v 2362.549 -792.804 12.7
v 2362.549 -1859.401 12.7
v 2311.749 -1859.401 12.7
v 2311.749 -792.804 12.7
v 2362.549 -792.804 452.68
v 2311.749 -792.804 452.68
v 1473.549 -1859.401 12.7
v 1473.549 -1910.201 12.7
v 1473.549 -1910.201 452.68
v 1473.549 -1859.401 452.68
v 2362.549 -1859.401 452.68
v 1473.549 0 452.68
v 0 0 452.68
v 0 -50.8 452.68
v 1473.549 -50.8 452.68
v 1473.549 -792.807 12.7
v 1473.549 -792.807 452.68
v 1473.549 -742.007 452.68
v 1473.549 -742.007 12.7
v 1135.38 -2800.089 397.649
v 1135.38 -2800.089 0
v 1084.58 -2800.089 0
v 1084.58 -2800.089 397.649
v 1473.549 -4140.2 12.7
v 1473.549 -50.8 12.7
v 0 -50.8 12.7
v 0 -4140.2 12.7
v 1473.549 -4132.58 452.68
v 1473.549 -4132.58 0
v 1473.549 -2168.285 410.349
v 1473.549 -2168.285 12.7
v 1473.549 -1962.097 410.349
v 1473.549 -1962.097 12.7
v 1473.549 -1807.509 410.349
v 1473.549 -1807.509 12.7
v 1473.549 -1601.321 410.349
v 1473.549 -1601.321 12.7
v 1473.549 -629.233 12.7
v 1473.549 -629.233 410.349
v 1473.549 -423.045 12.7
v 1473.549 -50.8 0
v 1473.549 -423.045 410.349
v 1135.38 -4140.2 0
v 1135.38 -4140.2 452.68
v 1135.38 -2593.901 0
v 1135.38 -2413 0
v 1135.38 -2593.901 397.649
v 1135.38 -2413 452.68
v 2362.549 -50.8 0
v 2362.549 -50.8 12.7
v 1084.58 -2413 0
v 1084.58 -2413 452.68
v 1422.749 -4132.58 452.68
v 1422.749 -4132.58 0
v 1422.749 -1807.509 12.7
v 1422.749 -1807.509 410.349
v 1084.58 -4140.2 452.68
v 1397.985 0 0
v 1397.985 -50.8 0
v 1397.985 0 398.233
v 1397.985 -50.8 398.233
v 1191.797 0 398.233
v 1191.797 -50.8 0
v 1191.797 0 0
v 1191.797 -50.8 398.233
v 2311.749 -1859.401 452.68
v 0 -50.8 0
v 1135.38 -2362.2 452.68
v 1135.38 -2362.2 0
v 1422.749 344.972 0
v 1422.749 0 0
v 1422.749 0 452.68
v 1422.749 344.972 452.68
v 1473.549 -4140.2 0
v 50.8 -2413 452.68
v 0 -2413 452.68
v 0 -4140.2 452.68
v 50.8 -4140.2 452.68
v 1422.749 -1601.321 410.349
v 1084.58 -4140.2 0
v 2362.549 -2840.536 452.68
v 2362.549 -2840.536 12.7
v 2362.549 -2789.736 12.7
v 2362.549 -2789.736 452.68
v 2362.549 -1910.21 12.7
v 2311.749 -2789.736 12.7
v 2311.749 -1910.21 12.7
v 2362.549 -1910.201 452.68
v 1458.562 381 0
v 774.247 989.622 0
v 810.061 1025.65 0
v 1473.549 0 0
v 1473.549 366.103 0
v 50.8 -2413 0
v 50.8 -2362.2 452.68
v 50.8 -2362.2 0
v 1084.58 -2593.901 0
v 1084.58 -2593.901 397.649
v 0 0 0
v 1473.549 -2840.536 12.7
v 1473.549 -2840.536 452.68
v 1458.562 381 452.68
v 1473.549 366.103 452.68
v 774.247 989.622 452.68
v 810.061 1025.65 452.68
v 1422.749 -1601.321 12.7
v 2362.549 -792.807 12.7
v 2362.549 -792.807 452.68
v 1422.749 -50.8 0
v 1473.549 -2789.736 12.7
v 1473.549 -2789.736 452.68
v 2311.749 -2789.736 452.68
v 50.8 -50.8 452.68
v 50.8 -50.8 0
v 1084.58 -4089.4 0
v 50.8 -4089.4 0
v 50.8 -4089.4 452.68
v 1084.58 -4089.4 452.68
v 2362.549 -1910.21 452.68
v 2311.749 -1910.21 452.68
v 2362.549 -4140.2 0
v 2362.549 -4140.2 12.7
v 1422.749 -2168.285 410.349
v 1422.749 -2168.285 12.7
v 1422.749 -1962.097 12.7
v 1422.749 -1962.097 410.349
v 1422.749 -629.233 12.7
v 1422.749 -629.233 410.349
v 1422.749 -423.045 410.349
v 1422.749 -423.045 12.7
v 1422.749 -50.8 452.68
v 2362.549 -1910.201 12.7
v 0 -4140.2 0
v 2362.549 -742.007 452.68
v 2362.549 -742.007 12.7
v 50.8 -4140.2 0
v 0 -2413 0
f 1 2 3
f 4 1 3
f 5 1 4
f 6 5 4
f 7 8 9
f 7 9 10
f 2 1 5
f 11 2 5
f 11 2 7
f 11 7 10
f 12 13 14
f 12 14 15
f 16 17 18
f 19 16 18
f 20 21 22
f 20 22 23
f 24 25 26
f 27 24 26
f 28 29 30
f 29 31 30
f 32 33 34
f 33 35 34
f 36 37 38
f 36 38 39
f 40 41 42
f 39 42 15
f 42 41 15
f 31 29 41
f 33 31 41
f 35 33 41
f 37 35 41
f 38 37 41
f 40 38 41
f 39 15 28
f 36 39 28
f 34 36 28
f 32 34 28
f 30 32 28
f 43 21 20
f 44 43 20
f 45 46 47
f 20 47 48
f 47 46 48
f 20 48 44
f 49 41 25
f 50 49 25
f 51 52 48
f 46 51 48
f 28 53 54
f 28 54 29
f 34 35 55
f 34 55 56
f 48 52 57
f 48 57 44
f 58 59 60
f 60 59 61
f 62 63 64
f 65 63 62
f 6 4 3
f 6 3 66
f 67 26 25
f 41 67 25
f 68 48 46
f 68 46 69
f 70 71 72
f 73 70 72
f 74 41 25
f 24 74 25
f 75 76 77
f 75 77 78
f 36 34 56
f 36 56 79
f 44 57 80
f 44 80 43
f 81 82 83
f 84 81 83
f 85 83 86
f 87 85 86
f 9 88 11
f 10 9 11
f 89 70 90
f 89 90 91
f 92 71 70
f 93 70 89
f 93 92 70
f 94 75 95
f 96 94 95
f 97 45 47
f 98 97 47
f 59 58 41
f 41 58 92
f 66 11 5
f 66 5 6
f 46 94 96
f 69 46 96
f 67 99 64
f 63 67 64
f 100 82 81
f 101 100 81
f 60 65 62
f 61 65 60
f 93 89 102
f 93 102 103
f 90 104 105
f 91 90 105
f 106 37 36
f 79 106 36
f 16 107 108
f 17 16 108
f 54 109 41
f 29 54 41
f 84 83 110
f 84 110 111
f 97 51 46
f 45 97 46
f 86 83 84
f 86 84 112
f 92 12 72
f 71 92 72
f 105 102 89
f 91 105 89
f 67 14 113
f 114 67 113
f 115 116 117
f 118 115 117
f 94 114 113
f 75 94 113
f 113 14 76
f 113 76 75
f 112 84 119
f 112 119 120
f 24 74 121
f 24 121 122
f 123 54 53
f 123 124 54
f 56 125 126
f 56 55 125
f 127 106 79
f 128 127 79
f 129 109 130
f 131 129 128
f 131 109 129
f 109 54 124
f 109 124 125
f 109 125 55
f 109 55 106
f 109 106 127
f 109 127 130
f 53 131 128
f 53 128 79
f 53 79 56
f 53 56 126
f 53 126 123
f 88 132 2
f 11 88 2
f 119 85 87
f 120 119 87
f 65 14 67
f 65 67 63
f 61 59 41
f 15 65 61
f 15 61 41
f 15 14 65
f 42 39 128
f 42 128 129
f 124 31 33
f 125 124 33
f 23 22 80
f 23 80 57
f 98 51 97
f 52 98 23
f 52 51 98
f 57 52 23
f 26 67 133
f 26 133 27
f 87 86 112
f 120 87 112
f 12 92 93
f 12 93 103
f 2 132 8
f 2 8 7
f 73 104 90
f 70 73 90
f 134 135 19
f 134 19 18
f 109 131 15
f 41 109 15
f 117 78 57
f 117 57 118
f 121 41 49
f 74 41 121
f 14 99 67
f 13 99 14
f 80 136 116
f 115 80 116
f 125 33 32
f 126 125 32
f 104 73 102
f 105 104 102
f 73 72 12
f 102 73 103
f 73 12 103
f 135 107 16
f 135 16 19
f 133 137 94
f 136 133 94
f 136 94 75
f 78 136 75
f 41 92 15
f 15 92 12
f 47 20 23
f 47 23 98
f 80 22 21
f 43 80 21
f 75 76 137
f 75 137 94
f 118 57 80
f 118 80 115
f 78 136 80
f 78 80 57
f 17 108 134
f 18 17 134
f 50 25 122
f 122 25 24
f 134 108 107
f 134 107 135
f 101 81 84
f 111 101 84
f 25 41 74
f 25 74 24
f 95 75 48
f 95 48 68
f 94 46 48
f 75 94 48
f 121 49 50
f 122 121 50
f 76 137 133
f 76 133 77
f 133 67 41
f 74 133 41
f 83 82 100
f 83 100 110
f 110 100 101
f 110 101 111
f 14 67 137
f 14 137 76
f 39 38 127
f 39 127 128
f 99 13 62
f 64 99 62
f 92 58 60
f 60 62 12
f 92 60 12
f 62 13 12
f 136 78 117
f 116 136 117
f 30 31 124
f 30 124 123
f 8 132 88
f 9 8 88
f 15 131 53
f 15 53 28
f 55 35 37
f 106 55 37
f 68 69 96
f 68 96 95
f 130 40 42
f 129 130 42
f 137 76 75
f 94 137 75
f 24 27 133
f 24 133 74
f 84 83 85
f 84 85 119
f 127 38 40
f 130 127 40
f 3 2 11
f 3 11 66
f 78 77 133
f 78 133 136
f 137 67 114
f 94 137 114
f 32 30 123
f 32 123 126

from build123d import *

# Parameters (mm, degrees)
F0_W      = 1473.5485315323
F0_H      = 452.6799321175
F1_DEPTH  = 50.8
F2_W      = 206.188082695
F2_H      = 398.2329070568
F3_DEPTH  = 71.12
F4_W      = 50.8
F4_H      = 452.6799321175
F5_DEPTH  = 2362.2
F6_W      = 50.8
F6_H      = 452.6799321175
F7_DEPTH  = 1084.58
F8_W      = 50.8
F8_H      = 452.6799321175
F9_DEPTH  = 1727.2
F10_W     = 206.188082695
F10_H     = 397.6490842178
F11_DEPTH = 111.76
F12_W     = 1191.797375679
F12_H     = 12.7
F12_W_2   = 206.188082695
F12_W_3   = 75.5630731583
F13_DEPTH = 4089.4
F14_DEPTH = 1727.2
F15_W     = 50.8
F15_H     = 452.6799321175
F16_DEPTH = 1033.78
F17_W     = 50.8
F17_H     = 452.6799321175
F18_DEPTH = 4081.78
F19_W     = 206.188082695
F19_H     = 397.6490842178
F20_DEPTH = 314.96
F21_W     = 50.8
F21_H     = 439.9799321175
F22_DEPTH = 889
F23_W     = 50.8
F23_H     = 439.9799321175
F24_DEPTH = 889
F25_W     = 50.8
F25_H     = 439.9799321175
F26_DEPTH = 879.5258
F27_W     = 50.8
F27_H     = 439.9799321175
F28_DEPTH = 889
F29_W     = 50.8
F29_H     = 439.9799321175
F30_DEPTH = 1066.5968
F31_DEPTH = 889
F32_W     = 50.8
F32_H     = 452.6799321175
F33_DEPTH = 381
F35_DEPTH = 505.46
F36_DEPTH = 914.4
F38_DEPTH = 546.1


with BuildPart() as f1:
    # F0 (on Front) → F1 (new body)
    with BuildSketch(Plane.XZ):
        with Locations((736.7742657661, 226.3399660587)):
            Rectangle(F0_W, F0_H)
    extrude(amount=F1_DEPTH)

    # F2 (on face) → F3 (cut)
    with BuildSketch(Plane.XZ.offset(50.8)):
        with Locations((1294.8914170265, 199.1164535284)):
            Rectangle(F2_W, F2_H)
    extrude(amount=-F3_DEPTH, mode=Mode.SUBTRACT)


with BuildPart() as f5:
    # F4 (on face) → F5 (new body)
    with BuildSketch(Plane.XZ.offset(50.8)):
        with Locations((25.4, 226.3399660587)):
            Rectangle(F4_W, F4_H)
    extrude(amount=F5_DEPTH)


with BuildPart() as f7:
    # F6 (on face) → F7 (new body)
    with BuildSketch(Plane.YZ.offset(50.8)):
        with Locations((-2387.6, 226.3399660587)):
            Rectangle(F6_W, F6_H)
    extrude(amount=F7_DEPTH)


with BuildPart() as f9:
    # F8 (on face) → F9 (new body)
    with BuildSketch(Plane.XZ.offset(2413)):
        with Locations((1109.98, 226.3399660587)):
            Rectangle(F8_W, F8_H)
    extrude(amount=F9_DEPTH)

    # F10 (on face) → F11 (cut)
    with BuildSketch(Plane.YZ.offset(1135.38)):
        with Locations((-2696.995358963, 198.8245421089)):
            Rectangle(F10_W, F10_H)
    extrude(amount=-F11_DEPTH, mode=Mode.SUBTRACT)


with BuildPart() as f13:
    # F12 (on face) → F13 (new body)
    with BuildSketch(Plane.XZ.offset(50.8)):
        with Locations((595.8986878395, 6.35)):
            Rectangle(F12_W, F12_H)
        with Locations((1294.8914170265, 6.35)):
            Rectangle(F12_W_2, F12_H)
        with Locations((1435.7669949532, 6.35)):
            Rectangle(F12_W_3, F12_H)
    extrude(amount=F13_DEPTH)


with BuildPart() as f14:
    # F14 (new): a face of the model
    f14_faces = [f5.part.faces().sort_by_distance(p)[0] for p in [
        (25.4, -2413, 226.3399660587),
    ]]
    extrude(f14_faces, amount=F14_DEPTH)


with BuildPart() as f16:
    # F15 (on face) → F16 (new body)
    with BuildSketch(Plane.YZ.offset(50.8)):
        with Locations((-4114.8, 226.3399660587)):
            Rectangle(F15_W, F15_H)
    extrude(amount=F16_DEPTH)


with BuildPart() as f18:
    # F17 (on face) → F18 (new body)
    with BuildSketch(Plane.XZ.offset(50.8)):
        with Locations((1448.1485315323, 226.3399660587)):
            Rectangle(F17_W, F17_H)
    extrude(amount=F18_DEPTH)

    # F19 (on face) → F20 (cut)
    with BuildSketch(Plane.YZ.offset(1473.5485315323)):
        with Locations((-2065.1913285255, 211.5245419554)):
            Rectangle(F19_W, F19_H)
        with Locations((-1704.414665699, 211.5245419554)):
            Rectangle(F19_W, F19_H)
        with Locations((-526.1393785477, 211.5245421089)):
            Rectangle(F19_W, F19_H)
    extrude(amount=-F20_DEPTH, mode=Mode.SUBTRACT)


with BuildPart() as f22:
    # F21 (on face) → F22 (new body)
    with BuildSketch(Plane.YZ.offset(1473.5485315323)):
        with Locations((-1884.8009070465, 232.6899660587)):
            Rectangle(F21_W, F21_H)
    extrude(amount=F22_DEPTH)


with BuildPart() as f24:
    # F23 (on face) → F24 (new body)
    with BuildSketch(Plane.YZ.offset(1473.5485315323)):
        with Locations((-2815.1361175537, 232.6899660587)):
            Rectangle(F23_W, F23_H)
    extrude(amount=F24_DEPTH)


with BuildPart() as f26:
    # F25 (on face) → F26 (new body)
    with BuildSketch(Plane(origin=(0, -2789.7361175537, 0), x_dir=(-1, 0, 0), z_dir=(0, 1, 0))):
        with Locations((-2337.1485315323, 232.6899660587)):
            Rectangle(F25_W, F25_H)
    extrude(amount=F26_DEPTH)


with BuildPart() as f28:
    # F27 (on face) → F28 (new body)
    with BuildSketch(Plane.YZ.offset(1473.5485315323)):
        with Locations((-767.4066253662, 232.6899660587)):
            Rectangle(F27_W, F27_H)
    extrude(amount=F28_DEPTH)


with BuildPart() as f30:
    # F29 (on face) → F30 (new body)
    with BuildSketch(Plane(origin=(0, -1859.4009070465, 0), x_dir=(-1, 0, 0), z_dir=(0, 1, 0))):
        with Locations((-2337.1485315323, 232.6899660587)):
            Rectangle(F29_W, F29_H)
    extrude(amount=F30_DEPTH)


with BuildPart() as f31:
    # F31 (new): a face of the model
    f31_faces = [f13.part.faces().sort_by_distance(p)[0] for p in [
        (1473.5485315323, -2095.5, 6.35),
    ]]
    extrude(f31_faces, amount=F31_DEPTH)


with BuildPart() as f33:
    # F32 (on face) → F33 (new body)
    with BuildSketch(Plane(origin=(0, 0, 0), x_dir=(-1, 0, 0), z_dir=(0, 1, 0))):
        with Locations((-1448.1485315323, 226.3399660587)):
            Rectangle(F32_W, F32_H)
    extrude(amount=F33_DEPTH)

    # F34 (on face) → F35 (cut)
    with BuildSketch(Plane.XY.offset(452.6799321175)):
        Polygon((1458.5624033598, 381), (1422.7485315323, 381), (1422.7485315323, 344.9721415468), align=None)
    extrude(amount=-F35_DEPTH, mode=Mode.SUBTRACT)

    # F36 (add): a face of the model
    f36_faces = [f33.faces().sort_by_distance(p)[0] for p in [
        (1440.655467446, 362.9860707734, 226.3399660587),
    ]]
    extrude(f36_faces, amount=F36_DEPTH)

    # F37 (on face) → F38 (cut)
    with BuildSketch(Plane.XY.offset(452.6799321175)):
        Polygon((1473.5485315323, 381), (1458.5624033598, 381), (1473.5485315323, 366.1028815865), align=None)
    extrude(amount=-F38_DEPTH, mode=Mode.SUBTRACT)


solid = Compound([f1.part, f5.part, f7.part, f9.part, f13.part, f14.part, f16.part, f18.part, f22.part, f24.part, f26.part, f28.part, f30.part, f31.part, f33.part])
